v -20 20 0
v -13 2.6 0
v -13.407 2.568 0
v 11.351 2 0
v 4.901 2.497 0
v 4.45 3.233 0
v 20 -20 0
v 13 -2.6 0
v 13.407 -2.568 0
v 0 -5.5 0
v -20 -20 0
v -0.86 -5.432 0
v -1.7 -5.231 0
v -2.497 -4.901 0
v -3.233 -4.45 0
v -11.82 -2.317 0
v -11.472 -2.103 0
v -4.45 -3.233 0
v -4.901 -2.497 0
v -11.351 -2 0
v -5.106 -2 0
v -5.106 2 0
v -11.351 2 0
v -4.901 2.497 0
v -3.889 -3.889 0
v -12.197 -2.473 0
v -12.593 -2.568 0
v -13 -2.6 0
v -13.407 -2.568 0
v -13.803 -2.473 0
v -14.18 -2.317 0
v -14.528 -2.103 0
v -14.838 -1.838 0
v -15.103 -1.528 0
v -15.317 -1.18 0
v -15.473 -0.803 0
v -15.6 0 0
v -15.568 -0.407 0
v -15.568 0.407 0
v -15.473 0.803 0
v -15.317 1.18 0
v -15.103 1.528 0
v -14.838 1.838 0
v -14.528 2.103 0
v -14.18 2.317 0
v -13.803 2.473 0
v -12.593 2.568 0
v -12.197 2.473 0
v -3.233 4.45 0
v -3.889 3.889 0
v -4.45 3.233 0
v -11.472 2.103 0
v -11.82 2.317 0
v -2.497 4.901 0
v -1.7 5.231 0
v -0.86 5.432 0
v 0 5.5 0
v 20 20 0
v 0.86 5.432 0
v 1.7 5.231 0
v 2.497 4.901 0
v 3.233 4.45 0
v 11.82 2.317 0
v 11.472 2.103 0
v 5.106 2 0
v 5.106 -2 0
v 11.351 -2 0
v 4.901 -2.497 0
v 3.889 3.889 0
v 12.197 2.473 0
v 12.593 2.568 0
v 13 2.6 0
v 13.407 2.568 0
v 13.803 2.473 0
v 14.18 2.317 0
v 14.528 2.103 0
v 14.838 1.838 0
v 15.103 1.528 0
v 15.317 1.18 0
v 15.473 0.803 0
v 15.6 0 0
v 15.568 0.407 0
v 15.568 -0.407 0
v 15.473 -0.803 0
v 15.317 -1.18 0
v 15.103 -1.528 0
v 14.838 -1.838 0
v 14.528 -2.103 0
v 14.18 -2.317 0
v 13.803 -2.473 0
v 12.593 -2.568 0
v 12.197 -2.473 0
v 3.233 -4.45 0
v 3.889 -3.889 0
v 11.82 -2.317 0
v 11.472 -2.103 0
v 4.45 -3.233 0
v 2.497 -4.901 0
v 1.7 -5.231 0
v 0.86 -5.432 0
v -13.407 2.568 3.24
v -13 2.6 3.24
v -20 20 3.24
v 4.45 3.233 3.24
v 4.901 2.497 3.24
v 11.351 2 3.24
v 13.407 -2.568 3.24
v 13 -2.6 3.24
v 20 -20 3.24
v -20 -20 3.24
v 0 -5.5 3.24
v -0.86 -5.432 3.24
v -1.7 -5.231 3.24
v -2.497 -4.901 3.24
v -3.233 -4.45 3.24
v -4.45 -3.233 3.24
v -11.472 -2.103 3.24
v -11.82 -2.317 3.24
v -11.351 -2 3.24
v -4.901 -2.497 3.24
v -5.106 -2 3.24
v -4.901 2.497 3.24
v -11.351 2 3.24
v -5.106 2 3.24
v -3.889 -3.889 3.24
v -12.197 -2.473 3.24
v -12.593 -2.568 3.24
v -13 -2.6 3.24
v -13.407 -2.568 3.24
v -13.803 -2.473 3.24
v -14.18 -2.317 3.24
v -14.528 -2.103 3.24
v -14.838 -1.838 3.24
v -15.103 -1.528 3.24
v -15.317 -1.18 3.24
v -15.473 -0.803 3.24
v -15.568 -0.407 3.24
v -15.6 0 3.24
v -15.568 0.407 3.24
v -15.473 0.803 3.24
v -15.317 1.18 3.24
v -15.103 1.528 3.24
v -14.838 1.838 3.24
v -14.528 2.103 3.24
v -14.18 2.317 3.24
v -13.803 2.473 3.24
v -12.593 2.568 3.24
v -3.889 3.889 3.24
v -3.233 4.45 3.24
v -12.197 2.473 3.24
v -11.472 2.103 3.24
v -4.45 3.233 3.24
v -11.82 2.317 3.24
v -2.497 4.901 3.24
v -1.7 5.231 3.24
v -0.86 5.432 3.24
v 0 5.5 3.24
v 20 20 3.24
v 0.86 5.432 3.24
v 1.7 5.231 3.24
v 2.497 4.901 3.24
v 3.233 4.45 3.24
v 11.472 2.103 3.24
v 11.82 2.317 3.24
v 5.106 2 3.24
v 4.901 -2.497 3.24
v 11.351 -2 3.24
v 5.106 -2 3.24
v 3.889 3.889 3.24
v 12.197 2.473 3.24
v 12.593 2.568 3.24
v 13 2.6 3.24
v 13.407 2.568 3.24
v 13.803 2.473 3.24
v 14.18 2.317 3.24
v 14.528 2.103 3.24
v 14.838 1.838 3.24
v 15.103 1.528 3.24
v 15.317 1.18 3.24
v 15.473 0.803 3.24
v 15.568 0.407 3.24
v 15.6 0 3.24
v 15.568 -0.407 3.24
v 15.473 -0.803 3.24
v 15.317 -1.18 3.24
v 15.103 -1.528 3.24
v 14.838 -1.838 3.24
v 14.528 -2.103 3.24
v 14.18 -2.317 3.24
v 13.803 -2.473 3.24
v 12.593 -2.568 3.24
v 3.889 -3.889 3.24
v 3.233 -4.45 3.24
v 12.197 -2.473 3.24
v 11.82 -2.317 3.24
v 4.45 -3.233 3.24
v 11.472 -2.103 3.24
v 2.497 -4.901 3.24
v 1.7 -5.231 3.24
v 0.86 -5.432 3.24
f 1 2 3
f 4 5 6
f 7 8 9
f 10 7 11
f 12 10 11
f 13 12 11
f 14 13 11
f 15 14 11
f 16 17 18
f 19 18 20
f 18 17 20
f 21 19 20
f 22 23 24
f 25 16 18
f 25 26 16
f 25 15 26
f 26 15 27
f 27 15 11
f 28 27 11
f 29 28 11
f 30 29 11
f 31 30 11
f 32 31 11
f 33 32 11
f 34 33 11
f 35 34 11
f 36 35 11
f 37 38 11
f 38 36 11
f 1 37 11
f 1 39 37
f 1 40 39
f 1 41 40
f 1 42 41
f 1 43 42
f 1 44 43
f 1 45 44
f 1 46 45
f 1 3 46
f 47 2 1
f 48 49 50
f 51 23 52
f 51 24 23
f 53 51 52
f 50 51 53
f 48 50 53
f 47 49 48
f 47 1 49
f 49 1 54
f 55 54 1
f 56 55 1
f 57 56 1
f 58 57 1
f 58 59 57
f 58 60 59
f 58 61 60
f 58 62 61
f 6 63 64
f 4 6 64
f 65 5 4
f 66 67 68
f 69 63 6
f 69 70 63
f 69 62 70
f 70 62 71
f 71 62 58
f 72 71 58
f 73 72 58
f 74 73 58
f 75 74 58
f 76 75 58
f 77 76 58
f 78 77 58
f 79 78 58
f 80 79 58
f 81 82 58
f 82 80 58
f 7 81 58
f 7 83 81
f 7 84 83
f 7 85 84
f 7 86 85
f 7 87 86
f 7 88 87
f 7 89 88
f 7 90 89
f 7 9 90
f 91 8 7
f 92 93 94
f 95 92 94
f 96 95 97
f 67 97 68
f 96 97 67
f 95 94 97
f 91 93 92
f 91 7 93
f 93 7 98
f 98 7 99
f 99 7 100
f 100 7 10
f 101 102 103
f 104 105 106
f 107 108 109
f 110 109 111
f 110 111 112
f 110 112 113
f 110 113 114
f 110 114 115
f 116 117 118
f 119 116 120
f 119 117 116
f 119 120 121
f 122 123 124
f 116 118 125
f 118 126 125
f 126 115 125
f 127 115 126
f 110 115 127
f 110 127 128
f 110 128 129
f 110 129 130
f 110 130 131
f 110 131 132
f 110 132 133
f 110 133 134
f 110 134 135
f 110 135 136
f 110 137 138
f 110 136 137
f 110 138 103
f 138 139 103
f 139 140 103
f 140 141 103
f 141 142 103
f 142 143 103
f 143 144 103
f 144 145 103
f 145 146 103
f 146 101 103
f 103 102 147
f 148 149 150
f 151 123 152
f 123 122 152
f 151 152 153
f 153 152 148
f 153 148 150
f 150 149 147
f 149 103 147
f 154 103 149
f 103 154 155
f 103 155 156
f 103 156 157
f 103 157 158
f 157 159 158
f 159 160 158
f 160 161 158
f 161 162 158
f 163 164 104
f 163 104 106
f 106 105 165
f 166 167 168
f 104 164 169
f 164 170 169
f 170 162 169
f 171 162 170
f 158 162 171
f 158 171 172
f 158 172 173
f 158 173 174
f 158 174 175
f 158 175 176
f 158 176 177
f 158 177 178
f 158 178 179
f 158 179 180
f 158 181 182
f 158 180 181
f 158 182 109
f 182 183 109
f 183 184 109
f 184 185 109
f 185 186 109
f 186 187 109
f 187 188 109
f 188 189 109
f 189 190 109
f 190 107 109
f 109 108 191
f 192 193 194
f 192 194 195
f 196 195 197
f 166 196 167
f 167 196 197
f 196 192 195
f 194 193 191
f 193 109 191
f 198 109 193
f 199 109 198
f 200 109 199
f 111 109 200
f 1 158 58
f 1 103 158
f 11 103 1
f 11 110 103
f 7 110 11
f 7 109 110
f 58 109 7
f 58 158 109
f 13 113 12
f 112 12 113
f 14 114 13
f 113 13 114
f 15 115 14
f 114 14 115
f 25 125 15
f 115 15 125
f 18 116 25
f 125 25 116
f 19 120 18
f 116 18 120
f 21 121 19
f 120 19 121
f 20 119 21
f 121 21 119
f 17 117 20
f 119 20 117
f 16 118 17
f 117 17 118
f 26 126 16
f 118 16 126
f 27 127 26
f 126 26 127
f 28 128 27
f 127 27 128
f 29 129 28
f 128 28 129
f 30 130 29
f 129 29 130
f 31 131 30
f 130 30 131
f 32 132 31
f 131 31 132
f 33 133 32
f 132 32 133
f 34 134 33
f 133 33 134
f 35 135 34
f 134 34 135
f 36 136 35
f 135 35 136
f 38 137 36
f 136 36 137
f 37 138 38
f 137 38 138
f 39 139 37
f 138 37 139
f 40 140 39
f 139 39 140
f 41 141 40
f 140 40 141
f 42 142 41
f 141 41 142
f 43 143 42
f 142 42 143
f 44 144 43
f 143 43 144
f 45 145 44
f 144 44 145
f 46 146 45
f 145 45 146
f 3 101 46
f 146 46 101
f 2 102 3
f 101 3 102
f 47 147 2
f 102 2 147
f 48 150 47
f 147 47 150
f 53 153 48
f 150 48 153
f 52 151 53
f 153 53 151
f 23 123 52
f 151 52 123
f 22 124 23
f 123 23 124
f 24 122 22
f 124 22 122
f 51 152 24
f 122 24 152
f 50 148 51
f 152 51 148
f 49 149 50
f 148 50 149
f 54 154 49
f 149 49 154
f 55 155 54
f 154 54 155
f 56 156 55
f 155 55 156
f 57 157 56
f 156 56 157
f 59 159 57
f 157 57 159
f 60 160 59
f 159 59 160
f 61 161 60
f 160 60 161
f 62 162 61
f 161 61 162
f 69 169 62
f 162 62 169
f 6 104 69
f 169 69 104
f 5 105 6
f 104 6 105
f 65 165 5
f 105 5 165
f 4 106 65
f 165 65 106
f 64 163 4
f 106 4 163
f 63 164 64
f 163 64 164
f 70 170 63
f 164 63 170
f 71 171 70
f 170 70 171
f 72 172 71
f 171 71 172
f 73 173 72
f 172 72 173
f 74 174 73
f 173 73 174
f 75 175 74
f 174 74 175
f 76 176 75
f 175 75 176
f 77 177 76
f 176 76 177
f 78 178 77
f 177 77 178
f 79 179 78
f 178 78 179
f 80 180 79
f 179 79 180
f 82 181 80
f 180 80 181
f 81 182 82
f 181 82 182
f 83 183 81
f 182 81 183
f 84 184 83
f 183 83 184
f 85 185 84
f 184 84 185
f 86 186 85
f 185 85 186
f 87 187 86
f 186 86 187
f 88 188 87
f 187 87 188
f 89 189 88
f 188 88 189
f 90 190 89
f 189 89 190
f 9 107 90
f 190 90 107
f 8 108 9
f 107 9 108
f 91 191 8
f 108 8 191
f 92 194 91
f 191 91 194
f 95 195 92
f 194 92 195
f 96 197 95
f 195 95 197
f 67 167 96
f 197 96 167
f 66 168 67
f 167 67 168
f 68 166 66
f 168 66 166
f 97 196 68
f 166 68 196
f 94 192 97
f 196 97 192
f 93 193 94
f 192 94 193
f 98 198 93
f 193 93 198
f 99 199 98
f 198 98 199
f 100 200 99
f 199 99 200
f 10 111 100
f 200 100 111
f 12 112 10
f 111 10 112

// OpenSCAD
/*
AUTHOR: Samuel M.H. <samuel.mh@gmail.com>
DESCRIPTION:
  This is a basic support for the electric motor I got from an old cassette player.
*/ 

BOLT_D=5.2;  //Bolt diameter
BOLT_SEP=13;  //Bolt separation
BOLT_RAIL=4;  //Bolt rail for installing the rubber dampers 
MOTOR_D=11;  //Motor (rotor) diameter
SUPPORT_SIZE=[40,40]; //Perimeter for the support
SUPPORT_DEPTH=3.24;  //Depth of the support

$fn=40;

linear_extrude(height=SUPPORT_DEPTH)
difference(){
    square(SUPPORT_SIZE, center=true);
    union(){
        circle(d=MOTOR_D);
        translate([-BOLT_SEP,0,0]) circle(d=BOLT_D);
        translate([BOLT_SEP,0,0]) circle(d=BOLT_D);
        square([2*BOLT_SEP, BOLT_RAIL], center=true);
    }
}
